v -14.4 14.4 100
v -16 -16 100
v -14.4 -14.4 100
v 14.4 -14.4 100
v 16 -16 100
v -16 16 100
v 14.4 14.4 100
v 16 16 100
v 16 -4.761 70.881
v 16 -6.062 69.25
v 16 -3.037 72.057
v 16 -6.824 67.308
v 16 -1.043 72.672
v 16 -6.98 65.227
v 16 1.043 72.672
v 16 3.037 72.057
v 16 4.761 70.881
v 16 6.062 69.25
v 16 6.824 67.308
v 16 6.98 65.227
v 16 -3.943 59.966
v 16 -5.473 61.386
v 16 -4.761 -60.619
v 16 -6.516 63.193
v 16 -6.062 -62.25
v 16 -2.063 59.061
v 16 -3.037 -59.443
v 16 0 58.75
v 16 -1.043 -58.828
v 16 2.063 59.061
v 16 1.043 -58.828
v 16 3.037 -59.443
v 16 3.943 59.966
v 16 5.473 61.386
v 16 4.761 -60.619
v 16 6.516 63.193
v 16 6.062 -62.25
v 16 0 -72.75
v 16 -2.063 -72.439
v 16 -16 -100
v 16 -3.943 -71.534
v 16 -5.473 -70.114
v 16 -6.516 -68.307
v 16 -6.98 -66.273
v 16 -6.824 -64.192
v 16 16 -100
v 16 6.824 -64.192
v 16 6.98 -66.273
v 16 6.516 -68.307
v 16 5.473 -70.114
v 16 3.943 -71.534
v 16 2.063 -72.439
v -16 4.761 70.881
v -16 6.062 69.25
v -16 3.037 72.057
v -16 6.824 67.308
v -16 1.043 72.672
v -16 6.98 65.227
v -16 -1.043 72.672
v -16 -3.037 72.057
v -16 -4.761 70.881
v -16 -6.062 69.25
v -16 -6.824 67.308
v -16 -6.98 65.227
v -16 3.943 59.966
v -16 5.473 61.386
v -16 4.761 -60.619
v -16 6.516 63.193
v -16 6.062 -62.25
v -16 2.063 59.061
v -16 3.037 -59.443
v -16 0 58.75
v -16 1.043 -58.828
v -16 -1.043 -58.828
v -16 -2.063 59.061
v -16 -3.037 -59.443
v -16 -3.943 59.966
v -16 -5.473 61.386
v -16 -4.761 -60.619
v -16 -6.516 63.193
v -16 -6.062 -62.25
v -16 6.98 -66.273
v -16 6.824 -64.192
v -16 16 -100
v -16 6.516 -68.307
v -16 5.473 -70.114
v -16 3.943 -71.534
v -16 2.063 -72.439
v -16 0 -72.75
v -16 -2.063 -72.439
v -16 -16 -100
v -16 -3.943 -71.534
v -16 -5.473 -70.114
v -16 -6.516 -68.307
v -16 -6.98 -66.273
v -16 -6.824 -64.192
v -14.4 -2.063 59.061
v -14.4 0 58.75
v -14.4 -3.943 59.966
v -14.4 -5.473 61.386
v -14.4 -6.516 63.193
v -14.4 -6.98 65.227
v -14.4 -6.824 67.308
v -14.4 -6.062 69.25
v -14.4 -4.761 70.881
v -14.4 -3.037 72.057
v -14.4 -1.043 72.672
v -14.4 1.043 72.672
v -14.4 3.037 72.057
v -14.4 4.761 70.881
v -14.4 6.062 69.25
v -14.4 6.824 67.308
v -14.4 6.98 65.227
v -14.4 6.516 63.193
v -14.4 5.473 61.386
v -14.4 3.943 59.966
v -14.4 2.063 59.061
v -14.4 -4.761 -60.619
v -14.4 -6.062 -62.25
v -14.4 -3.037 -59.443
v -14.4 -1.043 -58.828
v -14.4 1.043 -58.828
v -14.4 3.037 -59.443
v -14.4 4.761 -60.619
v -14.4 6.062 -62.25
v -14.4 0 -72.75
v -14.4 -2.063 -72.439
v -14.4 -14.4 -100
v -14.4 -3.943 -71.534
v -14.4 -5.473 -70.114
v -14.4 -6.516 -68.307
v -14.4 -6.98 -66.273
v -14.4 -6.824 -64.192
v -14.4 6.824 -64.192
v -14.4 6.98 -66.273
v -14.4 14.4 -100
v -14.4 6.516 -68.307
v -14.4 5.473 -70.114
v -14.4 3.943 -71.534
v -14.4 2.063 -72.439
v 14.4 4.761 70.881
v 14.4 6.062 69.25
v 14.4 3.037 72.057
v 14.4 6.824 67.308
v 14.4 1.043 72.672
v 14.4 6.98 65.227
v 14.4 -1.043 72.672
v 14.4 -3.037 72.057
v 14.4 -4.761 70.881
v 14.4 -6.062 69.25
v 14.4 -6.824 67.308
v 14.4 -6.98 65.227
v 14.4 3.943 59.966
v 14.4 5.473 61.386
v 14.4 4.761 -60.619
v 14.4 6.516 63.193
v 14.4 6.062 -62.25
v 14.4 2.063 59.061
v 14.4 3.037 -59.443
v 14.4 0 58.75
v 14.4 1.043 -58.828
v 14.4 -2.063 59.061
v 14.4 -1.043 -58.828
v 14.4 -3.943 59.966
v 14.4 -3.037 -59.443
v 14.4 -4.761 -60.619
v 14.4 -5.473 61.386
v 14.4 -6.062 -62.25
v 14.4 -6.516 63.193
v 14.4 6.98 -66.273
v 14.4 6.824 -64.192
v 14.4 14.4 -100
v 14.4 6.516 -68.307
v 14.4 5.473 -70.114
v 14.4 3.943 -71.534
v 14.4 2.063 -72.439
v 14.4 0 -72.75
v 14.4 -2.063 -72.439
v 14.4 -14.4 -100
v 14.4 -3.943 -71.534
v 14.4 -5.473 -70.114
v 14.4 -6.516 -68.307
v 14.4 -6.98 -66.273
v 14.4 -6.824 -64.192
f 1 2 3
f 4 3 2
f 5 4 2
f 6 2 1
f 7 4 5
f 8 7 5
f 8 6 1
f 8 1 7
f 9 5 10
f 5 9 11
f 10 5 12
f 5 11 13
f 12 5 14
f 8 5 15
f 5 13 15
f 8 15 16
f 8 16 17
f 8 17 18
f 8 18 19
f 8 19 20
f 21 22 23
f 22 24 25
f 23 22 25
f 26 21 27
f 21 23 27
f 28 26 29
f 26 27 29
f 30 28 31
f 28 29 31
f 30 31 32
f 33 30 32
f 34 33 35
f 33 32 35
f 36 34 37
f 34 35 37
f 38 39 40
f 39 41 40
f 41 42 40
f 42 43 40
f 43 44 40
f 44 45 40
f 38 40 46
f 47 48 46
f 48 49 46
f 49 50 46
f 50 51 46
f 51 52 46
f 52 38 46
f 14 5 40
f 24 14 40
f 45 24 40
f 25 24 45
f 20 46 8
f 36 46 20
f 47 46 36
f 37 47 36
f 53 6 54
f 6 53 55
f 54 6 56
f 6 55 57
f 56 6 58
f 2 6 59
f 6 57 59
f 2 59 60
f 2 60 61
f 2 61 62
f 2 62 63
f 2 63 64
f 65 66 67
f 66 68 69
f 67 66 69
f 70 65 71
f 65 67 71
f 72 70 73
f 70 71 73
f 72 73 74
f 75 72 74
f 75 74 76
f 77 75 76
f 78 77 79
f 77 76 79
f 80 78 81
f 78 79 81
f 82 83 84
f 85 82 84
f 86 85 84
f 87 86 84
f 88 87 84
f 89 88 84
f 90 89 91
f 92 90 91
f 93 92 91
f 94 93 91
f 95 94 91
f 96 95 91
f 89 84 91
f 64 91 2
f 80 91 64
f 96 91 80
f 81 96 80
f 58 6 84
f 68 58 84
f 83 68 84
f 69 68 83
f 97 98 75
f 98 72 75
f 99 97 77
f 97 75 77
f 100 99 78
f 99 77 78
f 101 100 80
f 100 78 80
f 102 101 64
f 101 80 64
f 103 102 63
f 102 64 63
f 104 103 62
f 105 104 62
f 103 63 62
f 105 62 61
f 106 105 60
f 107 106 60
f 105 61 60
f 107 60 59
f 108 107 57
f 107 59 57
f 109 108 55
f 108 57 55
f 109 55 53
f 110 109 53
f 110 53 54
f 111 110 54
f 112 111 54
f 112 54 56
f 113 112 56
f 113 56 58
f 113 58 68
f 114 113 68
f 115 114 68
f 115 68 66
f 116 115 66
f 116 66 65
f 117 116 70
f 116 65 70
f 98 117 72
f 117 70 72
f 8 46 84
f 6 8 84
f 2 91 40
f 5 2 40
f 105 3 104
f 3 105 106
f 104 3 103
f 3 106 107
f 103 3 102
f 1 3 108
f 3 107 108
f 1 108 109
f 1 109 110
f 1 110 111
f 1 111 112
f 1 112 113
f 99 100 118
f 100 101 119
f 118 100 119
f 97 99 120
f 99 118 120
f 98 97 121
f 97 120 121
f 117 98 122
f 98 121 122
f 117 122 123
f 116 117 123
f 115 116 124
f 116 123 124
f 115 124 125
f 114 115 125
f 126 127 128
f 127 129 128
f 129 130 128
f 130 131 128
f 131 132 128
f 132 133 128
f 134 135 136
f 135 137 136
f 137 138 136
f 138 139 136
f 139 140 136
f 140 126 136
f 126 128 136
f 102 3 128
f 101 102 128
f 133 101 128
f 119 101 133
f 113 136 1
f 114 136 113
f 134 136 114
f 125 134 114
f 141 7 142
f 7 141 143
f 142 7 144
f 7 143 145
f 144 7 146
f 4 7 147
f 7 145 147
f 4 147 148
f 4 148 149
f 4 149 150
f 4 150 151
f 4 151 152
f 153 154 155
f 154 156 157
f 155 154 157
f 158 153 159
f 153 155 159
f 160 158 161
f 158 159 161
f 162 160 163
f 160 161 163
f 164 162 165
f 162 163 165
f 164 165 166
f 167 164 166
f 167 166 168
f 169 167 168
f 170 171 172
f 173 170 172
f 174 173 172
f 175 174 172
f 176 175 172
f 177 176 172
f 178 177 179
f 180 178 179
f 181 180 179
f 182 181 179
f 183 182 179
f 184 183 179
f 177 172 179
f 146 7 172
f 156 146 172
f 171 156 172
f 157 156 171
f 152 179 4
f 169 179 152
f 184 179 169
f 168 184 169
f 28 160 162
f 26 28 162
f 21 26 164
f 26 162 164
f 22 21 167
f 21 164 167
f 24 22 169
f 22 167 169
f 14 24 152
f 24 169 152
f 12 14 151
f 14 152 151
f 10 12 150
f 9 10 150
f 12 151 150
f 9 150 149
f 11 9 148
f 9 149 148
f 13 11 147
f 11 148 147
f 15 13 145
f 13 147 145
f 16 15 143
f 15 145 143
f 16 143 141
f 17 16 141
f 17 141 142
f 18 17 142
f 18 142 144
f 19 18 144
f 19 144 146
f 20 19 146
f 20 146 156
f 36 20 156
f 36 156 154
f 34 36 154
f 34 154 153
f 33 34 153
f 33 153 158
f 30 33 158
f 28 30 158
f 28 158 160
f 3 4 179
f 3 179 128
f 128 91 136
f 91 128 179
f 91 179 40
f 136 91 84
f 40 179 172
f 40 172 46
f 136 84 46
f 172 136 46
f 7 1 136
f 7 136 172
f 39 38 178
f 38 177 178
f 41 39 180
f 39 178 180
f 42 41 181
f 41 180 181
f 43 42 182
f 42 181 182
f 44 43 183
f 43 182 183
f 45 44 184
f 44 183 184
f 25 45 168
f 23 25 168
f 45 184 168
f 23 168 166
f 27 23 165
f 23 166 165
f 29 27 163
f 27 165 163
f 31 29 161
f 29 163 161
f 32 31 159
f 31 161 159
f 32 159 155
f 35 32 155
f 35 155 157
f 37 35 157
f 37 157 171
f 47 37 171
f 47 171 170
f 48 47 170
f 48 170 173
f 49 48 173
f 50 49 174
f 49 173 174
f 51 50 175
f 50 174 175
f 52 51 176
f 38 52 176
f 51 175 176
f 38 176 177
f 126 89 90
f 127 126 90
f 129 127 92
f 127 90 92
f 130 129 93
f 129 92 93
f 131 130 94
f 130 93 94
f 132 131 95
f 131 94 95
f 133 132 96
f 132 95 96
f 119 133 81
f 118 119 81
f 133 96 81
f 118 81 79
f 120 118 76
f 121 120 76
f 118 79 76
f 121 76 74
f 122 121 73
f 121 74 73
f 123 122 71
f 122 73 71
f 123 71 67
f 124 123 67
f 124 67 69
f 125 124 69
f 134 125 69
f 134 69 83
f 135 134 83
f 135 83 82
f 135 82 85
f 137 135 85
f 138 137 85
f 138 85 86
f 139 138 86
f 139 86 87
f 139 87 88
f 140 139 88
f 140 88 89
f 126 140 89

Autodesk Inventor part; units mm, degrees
ref_plane "YZ Plane" through (0, 0, 0) normal (1, 0, 0) x (0, 1, 0)
ref_plane "XZ Plane" through (0, 0, 0) normal (0, 1, 0) x (-1, 0, 0)
sketch "スケッチ1" plane through (0, 0, 0) normal (0, 0, 1) x (1, 0, 0)
  line L0 (-16, -16) -> (16, -16)
  line L1 (16, -16) -> (16, 16)
  line L2 (16, 16) -> (-16, 16)
  line L3 (-16, 16) -> (-16, -16)
  line L4 (-16, -16) -> (16, 16) construction
  line L5 (16, -16) -> (-16, 16) construction
  line L6 (-14.4, 14.4) -> (14.4, 14.4)
  line L7 (14.4, 14.4) -> (14.4, -14.4)
  line L8 (14.4, -14.4) -> (-14.4, -14.4)
  line L9 (-14.4, -14.4) -> (-14.4, 14.4)
  point P0 (0, 0)
  dimension "d0" = 32
  dimension "d1" = 32
  dimension "d2" = 1.6
extrude "押し出し1" add sketch "スケッチ1" along normal mid plane 200
ref_plane "作業平面1" through (16, -16, 100) normal (1, 0, 0) x (0, 0, -1)
sketch "スケッチ6" plane through (16, -16, 100) normal (1, 0, 0) x (0, 0, -1)
  line L0 (0, 0) -> (0, 32) projected
  line L1 (200, 32) -> (200, 0) projected
  point P0 (100, 16)
  point P1 (34.25, 16)
  point P2 (165.75, 16)
  dimension "d20" = 34.25
  dimension "d21" = 34.25
hole "穴2" at (16, 0, 65.75) at (16, 0, -65.75) direction (-1, 0, 0) diameter 14 end through all
properties part number "Pipe横"
